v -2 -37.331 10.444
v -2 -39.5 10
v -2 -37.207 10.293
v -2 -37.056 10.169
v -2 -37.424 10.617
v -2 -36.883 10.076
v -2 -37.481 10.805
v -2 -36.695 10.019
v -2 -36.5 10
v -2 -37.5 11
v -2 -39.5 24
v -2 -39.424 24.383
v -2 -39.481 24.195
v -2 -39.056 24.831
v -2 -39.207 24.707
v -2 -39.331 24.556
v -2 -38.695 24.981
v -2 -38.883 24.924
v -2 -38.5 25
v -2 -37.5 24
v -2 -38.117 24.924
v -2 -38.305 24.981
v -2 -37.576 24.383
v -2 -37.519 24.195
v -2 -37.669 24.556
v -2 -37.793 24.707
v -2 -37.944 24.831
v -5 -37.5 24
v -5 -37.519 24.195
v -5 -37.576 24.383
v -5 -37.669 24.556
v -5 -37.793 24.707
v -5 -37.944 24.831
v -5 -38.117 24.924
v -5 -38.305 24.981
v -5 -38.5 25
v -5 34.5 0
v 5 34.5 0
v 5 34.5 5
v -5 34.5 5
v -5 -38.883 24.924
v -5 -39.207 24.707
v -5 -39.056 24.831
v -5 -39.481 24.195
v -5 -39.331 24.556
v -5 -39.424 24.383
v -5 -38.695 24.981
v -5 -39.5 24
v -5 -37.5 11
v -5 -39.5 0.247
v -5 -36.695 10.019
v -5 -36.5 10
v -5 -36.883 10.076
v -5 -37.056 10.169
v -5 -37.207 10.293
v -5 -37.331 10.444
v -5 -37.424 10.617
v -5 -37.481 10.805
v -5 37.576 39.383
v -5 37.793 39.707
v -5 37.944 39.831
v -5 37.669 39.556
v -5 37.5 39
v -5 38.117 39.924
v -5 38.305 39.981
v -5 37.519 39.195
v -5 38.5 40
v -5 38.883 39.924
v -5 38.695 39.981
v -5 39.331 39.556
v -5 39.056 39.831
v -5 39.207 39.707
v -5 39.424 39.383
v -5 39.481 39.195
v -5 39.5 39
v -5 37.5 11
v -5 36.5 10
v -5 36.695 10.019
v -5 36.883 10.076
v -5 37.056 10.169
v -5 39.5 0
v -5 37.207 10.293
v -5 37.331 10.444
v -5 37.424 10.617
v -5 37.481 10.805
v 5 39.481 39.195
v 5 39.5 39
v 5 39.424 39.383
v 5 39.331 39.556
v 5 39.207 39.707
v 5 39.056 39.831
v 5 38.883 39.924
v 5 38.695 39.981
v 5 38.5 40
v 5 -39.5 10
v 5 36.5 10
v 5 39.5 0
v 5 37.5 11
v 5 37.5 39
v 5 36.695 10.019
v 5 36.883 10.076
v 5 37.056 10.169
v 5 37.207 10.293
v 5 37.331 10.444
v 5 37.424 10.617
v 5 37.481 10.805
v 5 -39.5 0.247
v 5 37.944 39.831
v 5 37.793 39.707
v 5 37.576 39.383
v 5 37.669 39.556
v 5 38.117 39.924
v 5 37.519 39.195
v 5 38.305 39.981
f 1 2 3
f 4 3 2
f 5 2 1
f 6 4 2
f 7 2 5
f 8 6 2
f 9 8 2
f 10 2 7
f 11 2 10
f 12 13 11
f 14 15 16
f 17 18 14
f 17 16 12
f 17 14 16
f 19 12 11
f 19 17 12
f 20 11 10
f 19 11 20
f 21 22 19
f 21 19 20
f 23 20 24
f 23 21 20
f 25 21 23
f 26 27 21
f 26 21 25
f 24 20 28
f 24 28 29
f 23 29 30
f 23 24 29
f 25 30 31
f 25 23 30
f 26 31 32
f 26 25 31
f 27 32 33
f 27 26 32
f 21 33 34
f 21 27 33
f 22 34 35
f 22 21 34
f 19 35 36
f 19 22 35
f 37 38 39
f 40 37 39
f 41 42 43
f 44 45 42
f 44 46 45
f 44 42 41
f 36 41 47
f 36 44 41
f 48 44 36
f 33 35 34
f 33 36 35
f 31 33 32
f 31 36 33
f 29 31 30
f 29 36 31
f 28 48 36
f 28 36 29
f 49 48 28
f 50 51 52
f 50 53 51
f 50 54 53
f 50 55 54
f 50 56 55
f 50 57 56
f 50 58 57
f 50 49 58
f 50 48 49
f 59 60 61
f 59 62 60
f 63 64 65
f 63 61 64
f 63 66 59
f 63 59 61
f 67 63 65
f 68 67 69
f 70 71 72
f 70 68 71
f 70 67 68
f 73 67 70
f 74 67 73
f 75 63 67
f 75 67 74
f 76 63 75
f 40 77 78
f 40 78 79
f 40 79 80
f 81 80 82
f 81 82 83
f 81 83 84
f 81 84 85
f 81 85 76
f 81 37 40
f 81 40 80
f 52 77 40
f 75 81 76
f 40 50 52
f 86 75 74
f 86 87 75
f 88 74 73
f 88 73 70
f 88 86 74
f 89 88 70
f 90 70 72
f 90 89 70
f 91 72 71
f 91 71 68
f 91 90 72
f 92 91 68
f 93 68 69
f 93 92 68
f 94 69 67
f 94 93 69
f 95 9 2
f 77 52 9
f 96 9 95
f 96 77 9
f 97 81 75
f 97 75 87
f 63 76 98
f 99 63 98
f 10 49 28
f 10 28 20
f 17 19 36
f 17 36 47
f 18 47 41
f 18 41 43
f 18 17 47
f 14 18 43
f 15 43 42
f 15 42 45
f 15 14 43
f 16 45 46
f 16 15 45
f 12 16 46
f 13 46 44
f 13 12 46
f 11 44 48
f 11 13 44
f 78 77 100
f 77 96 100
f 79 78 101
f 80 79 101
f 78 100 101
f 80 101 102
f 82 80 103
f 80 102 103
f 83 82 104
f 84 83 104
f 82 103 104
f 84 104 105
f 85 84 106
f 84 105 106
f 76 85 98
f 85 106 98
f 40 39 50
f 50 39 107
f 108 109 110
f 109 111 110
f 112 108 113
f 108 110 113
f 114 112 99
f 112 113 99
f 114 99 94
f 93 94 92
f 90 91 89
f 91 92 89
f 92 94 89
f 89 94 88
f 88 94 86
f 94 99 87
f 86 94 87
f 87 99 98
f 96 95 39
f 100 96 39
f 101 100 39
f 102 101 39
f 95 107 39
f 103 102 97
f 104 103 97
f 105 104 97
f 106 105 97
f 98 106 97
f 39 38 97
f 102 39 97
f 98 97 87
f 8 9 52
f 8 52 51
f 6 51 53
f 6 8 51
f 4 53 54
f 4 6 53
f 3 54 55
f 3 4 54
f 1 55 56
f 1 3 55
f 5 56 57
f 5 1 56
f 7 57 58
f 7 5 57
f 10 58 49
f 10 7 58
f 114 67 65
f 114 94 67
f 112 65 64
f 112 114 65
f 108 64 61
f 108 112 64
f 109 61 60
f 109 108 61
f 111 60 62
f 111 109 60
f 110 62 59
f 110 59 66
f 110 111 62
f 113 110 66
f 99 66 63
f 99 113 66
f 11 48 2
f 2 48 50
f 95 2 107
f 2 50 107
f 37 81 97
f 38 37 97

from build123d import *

# Parameters (mm, degrees)
F0_W      = 10
F0_H      = 79
F1_DEPTH  = 10
F2_W      = 10
F2_H      = 2
F3_DEPTH  = 15
F4_W      = 10
F4_H      = 2
F5_DEPTH  = 30
F7_DEPTH  = 10.001
F8_R      = 0.99999
F9_W      = 4.9229283333
F9_H      = 15
F10_DEPTH = 7


# Not quite as in the source:
# - a fillet or chamfer is up to 0.001 mm smaller than in the source, because OpenCascade refuses the exact size


with BuildPart() as f1:
    # F0 (on Top) → F1 (new body)
    with BuildSketch(Plane.XY):
        Rectangle(F0_W, F0_H)
    extrude(amount=F1_DEPTH)

    # F2 (on face) → F3 (join)
    with BuildSketch(Plane.XY.offset(10)):
        with Locations((0, -38.5)):
            Rectangle(F2_W, F2_H)
    extrude(amount=F3_DEPTH)

    # F4 (on face) → F5 (join)
    with BuildSketch(Plane.XY.offset(10)):
        with Locations((0, 38.5)):
            Rectangle(F4_W, F4_H)
    extrude(amount=F5_DEPTH)

    # F6 (on face) → F7 (cut, through all)
    with BuildSketch(Plane.YZ.offset(5)):
        Polygon((34.5, 5), (-43.3395786217, 0), (34.5, 0), align=None)
    extrude(amount=-F7_DEPTH, mode=Mode.SUBTRACT)

    # F8 (radius 1 in the source; OpenCascade refuses exactly that, so slightly less here)
    f8_edges = [f1.edges().sort_by_distance(p)[0] for p in [
        (0, -39.5, 25),
        (0, -37.5, 25),
        (0, 37.5, 40),
        (0, 39.5, 40),
        (0, -37.5, 10),
        (0, 37.5, 10),
    ]]
    fillet(f8_edges, radius=F8_R)

    # F9 (on face) → F10 (cut)
    with BuildSketch(Plane.YZ.offset(5)):
        with Locations((-37.0385358334, 17.5)):
            Rectangle(F9_W, F9_H)
    extrude(amount=-F10_DEPTH, mode=Mode.SUBTRACT)


solid = f1.part
